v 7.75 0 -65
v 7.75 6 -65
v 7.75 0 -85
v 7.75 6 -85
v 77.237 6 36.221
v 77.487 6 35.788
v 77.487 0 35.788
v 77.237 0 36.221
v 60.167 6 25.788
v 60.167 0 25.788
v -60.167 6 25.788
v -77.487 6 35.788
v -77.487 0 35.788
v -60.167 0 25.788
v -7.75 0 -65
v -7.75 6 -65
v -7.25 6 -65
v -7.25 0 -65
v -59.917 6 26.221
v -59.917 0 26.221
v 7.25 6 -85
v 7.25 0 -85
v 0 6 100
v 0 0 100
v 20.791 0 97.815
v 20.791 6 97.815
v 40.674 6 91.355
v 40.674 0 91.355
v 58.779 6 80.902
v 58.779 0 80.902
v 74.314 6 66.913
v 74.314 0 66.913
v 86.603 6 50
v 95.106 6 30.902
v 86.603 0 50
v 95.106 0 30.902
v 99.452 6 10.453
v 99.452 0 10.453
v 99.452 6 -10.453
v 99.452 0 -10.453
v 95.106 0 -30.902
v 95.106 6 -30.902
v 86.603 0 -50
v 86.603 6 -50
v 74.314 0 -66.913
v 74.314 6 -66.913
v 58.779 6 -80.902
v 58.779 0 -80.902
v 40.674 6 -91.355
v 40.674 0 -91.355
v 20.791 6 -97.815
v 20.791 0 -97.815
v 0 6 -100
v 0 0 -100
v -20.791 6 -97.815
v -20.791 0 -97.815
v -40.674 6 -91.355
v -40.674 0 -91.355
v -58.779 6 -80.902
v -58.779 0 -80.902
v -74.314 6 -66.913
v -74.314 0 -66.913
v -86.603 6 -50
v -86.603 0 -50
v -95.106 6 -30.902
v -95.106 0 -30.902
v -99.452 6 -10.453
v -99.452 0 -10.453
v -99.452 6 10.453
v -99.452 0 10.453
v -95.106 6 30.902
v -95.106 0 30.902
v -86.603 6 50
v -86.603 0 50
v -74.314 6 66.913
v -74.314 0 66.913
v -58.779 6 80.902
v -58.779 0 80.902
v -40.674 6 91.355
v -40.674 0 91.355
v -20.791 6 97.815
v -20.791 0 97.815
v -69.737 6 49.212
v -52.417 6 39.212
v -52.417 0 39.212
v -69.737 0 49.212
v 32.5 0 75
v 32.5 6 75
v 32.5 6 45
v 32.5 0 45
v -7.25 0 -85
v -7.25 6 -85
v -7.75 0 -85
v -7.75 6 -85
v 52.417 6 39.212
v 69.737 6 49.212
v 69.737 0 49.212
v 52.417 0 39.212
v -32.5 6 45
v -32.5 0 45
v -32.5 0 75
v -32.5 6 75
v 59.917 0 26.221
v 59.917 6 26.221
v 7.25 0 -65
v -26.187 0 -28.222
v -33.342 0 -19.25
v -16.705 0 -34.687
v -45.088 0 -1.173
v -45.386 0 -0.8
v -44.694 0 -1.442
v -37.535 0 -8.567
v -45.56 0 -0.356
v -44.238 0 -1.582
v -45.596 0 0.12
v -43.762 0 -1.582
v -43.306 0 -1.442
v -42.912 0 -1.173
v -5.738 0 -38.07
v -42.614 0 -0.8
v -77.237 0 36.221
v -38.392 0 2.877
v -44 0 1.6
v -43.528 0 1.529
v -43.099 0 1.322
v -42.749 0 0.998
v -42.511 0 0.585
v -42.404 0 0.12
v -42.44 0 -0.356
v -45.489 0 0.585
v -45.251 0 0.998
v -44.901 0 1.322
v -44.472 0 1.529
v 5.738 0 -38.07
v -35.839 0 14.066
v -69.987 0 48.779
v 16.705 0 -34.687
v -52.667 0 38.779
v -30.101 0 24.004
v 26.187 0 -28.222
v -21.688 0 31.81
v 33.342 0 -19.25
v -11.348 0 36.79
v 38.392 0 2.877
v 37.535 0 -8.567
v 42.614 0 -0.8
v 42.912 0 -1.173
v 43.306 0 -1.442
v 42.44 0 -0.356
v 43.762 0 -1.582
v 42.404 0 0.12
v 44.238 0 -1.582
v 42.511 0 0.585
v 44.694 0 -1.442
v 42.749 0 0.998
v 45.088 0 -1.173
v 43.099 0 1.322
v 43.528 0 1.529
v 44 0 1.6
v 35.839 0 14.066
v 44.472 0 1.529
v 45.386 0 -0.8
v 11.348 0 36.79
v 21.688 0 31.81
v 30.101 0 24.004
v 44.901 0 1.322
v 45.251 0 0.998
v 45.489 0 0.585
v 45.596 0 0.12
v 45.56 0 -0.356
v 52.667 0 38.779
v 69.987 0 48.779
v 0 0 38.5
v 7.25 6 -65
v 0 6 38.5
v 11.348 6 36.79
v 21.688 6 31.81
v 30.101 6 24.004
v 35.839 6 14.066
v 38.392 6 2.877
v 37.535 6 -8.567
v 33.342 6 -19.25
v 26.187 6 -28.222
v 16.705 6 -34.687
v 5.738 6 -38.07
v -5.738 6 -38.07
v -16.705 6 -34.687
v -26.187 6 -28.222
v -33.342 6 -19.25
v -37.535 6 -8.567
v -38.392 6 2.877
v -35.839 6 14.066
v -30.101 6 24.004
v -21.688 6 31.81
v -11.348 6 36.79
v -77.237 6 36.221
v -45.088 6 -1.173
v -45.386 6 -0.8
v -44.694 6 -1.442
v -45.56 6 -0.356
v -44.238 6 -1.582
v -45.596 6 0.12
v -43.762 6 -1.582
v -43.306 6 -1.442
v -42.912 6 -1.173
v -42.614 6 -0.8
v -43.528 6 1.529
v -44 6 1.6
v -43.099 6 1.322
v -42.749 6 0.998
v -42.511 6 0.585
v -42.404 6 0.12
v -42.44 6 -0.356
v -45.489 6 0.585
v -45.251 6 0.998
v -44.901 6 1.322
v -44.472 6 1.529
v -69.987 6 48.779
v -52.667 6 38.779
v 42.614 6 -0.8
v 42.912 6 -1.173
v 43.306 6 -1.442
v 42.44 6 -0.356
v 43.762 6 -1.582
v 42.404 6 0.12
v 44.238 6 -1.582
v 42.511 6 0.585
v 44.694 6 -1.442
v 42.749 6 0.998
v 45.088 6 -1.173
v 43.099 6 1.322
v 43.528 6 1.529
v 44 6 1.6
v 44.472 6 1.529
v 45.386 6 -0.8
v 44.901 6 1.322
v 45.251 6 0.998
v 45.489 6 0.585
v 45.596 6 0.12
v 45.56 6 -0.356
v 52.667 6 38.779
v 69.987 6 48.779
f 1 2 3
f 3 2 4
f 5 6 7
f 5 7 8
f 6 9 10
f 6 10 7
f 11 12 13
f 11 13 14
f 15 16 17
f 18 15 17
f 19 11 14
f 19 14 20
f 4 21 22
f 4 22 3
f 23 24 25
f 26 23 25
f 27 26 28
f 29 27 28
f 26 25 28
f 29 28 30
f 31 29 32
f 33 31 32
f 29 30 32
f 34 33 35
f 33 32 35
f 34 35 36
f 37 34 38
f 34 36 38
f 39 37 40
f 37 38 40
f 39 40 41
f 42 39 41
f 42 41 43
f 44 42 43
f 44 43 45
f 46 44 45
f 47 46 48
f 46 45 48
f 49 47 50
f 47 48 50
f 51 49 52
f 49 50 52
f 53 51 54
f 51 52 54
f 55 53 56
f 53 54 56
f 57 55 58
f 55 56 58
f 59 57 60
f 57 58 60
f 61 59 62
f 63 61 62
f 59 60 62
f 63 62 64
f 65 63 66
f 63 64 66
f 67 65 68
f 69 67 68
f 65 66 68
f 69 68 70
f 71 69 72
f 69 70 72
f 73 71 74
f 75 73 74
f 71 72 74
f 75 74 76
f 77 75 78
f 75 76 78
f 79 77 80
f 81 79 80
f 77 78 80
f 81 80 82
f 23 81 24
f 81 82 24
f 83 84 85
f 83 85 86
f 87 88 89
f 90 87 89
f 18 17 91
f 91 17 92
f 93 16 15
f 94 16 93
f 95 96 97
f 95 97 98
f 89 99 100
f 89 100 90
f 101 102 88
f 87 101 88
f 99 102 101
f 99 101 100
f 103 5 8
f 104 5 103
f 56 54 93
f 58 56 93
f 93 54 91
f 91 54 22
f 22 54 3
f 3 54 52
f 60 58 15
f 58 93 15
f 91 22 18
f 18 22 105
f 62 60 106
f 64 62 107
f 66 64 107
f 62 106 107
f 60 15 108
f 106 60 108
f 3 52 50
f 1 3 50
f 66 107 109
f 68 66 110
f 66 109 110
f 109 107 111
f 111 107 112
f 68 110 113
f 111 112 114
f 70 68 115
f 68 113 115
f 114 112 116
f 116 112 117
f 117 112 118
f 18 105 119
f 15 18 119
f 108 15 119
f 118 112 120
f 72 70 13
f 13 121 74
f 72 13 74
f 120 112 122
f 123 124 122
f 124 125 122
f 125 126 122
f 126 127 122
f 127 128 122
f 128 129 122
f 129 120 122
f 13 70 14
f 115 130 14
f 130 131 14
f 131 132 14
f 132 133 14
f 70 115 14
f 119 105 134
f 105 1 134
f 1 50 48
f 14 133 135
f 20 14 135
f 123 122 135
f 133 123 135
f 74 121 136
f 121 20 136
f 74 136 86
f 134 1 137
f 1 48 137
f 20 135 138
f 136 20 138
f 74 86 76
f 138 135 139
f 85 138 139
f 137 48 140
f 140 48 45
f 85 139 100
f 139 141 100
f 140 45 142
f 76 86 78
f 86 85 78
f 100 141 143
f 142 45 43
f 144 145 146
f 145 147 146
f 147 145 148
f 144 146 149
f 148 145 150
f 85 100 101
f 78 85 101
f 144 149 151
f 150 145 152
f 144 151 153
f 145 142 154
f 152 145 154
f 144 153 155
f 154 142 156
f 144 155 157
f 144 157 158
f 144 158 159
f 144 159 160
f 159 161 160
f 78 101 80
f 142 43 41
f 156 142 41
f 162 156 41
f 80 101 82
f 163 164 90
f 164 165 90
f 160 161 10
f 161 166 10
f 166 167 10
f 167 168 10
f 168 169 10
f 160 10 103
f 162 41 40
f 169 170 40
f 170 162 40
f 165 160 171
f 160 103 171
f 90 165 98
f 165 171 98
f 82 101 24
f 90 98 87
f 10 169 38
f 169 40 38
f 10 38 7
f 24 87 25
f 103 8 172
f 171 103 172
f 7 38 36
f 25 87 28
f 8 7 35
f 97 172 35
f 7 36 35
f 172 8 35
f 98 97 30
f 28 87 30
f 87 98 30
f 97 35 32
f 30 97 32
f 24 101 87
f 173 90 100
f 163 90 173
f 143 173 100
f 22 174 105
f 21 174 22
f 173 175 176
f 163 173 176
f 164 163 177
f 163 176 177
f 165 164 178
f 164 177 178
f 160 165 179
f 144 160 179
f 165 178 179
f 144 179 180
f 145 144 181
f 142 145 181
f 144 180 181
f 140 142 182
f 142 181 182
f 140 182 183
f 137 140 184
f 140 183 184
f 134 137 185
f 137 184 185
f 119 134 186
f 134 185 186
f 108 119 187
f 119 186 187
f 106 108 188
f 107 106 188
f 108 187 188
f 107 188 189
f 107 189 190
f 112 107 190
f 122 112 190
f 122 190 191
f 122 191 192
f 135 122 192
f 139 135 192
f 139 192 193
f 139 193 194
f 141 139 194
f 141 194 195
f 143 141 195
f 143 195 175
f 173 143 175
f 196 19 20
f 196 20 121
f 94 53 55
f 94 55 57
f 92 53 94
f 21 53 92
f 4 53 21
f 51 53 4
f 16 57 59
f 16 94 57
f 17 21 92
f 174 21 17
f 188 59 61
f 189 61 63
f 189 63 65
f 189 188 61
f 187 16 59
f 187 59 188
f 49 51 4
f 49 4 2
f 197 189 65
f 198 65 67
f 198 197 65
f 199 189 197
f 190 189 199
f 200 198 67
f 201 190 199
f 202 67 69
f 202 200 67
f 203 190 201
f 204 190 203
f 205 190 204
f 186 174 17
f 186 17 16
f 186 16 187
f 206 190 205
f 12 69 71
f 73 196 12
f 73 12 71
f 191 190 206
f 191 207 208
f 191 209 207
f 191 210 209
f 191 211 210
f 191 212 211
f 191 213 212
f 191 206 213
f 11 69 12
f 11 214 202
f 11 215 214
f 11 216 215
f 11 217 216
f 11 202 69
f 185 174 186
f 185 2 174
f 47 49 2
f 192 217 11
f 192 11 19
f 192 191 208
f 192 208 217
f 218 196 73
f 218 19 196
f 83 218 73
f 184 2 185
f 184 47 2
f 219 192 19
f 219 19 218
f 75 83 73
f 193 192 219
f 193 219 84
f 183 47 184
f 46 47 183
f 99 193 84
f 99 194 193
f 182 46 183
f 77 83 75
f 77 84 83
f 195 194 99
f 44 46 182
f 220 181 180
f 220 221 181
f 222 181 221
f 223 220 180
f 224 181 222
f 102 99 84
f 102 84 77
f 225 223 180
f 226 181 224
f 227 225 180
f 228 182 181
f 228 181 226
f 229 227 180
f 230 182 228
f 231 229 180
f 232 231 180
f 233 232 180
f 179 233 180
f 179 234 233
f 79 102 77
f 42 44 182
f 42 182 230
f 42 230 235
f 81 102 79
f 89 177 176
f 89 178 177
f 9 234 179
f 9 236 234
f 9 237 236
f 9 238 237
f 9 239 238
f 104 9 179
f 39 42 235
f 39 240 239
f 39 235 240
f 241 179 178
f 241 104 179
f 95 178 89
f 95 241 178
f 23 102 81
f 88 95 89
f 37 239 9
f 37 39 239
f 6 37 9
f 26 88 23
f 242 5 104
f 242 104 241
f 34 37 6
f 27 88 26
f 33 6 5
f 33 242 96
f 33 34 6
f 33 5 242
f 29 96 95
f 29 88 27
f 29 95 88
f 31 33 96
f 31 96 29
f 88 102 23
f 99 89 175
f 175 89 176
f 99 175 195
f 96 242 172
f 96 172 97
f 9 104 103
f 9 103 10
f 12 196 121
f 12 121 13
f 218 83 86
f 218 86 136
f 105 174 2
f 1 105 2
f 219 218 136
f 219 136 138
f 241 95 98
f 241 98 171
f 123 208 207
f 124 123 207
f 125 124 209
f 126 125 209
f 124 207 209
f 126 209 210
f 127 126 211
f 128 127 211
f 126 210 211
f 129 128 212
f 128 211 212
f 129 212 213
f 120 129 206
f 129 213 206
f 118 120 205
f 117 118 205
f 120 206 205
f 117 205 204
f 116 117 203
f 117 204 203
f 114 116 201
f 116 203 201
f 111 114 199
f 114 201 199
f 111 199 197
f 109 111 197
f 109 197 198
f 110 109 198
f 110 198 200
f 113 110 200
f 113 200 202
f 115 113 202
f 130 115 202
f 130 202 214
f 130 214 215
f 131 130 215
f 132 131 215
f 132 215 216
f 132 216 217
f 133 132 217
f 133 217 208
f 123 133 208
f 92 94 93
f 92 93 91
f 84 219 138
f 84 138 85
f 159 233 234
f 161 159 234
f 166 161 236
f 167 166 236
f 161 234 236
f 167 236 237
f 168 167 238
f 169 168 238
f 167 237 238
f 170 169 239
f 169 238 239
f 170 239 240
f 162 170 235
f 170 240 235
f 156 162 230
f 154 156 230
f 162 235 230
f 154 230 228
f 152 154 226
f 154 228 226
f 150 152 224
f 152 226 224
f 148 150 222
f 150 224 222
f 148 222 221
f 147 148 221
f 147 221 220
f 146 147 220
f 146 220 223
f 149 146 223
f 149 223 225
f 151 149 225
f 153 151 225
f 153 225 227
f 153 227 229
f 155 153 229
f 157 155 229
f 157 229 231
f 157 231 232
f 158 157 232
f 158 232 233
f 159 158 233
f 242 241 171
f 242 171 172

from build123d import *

# Parameters (mm, degrees)
SKETCH2_R           = 100
BOSS_EXTRUDE1_DEPTH = 6
SKETCH3_W           = 0.5
SKETCH3_H           = 20
CUT_EXTRUDE1_DEPTH  = 142.548578234
SKETCH4_R           = 38.5
CUT_EXTRUDE2_DEPTH  = 142.548578234
SKETCH5_R           = 1.6
CUT_EXTRUDE3_DEPTH  = 142.548578234
SKETCH6_W           = 65
SKETCH6_H           = 30
CUT_EXTRUDE4_DEPTH  = 142.548578234


with BuildPart() as part:
    # Sketch2 → Boss-Extrude1 (new body)
    with BuildSketch(Plane(origin=(0, 0, 0), x_dir=(1, 0, 0), z_dir=(0, 1, 0))):
        with Locations(Location((0, 0, 0), (0, 0, 270))):
            Circle(SKETCH2_R)
    extrude(amount=BOSS_EXTRUDE1_DEPTH)

    # Sketch3 → Cut-Extrude1 (cut, through all)
    with BuildSketch(Plane(origin=(0, 6, 0), x_dir=(1, 0, 0), z_dir=(0, 1, 0))):
        with Locations((-7.5, 75)):
            Rectangle(SKETCH3_W, SKETCH3_H)
        with Locations((7.5, 75)):
            Rectangle(SKETCH3_W, SKETCH3_H)
        Polygon((60.166651246, -25.788303121), (77.487159322, -35.788303121), (77.237159322, -36.221315823), (59.916651246, -26.221315823), align=None)
        Polygon((52.666651246, -38.778684177), (69.987159322, -48.778684177), (69.737159322, -49.211696879), (52.416651246, -39.211696879), align=None)
        Polygon((-52.416651246, -39.211696879), (-69.737159322, -49.211696879), (-69.987159322, -48.778684177), (-52.666651246, -38.778684177), align=None)
        Polygon((-59.916651246, -26.221315823), (-77.237159322, -36.221315823), (-77.487159322, -35.788303121), (-60.166651246, -25.788303121), align=None)
    extrude(amount=-CUT_EXTRUDE1_DEPTH, mode=Mode.SUBTRACT)

    # Sketch4 → Cut-Extrude2 (cut, through all)
    with BuildSketch(Plane(origin=(0, 6, 0), x_dir=(1, 0, 0), z_dir=(0, 1, 0))):
        with Locations(Location((0, 0, 0), (0, 0, 270))):
            Circle(SKETCH4_R)
    extrude(amount=-CUT_EXTRUDE2_DEPTH, mode=Mode.SUBTRACT)

    # Sketch5 → Cut-Extrude3 (cut, through all)
    with BuildSketch(Plane(origin=(0, 6, 0), x_dir=(1, 0, 0), z_dir=(0, 1, 0))):
        with Locations(Location((-44, 0, 0), (0, 0, 270))):
            Circle(SKETCH5_R)
        with Locations(Location((44, 0, 0), (0, 0, 270))):
            Circle(SKETCH5_R)
    extrude(amount=-CUT_EXTRUDE3_DEPTH, mode=Mode.SUBTRACT)

    # Sketch6 → Cut-Extrude4 (cut, through all)
    with BuildSketch(Plane(origin=(0, 6, 0), x_dir=(1, 0, 0), z_dir=(0, 1, 0))):
        with Locations((0, -60)):
            Rectangle(SKETCH6_W, SKETCH6_H)
    extrude(amount=-CUT_EXTRUDE4_DEPTH, mode=Mode.SUBTRACT)


solid = part.part
